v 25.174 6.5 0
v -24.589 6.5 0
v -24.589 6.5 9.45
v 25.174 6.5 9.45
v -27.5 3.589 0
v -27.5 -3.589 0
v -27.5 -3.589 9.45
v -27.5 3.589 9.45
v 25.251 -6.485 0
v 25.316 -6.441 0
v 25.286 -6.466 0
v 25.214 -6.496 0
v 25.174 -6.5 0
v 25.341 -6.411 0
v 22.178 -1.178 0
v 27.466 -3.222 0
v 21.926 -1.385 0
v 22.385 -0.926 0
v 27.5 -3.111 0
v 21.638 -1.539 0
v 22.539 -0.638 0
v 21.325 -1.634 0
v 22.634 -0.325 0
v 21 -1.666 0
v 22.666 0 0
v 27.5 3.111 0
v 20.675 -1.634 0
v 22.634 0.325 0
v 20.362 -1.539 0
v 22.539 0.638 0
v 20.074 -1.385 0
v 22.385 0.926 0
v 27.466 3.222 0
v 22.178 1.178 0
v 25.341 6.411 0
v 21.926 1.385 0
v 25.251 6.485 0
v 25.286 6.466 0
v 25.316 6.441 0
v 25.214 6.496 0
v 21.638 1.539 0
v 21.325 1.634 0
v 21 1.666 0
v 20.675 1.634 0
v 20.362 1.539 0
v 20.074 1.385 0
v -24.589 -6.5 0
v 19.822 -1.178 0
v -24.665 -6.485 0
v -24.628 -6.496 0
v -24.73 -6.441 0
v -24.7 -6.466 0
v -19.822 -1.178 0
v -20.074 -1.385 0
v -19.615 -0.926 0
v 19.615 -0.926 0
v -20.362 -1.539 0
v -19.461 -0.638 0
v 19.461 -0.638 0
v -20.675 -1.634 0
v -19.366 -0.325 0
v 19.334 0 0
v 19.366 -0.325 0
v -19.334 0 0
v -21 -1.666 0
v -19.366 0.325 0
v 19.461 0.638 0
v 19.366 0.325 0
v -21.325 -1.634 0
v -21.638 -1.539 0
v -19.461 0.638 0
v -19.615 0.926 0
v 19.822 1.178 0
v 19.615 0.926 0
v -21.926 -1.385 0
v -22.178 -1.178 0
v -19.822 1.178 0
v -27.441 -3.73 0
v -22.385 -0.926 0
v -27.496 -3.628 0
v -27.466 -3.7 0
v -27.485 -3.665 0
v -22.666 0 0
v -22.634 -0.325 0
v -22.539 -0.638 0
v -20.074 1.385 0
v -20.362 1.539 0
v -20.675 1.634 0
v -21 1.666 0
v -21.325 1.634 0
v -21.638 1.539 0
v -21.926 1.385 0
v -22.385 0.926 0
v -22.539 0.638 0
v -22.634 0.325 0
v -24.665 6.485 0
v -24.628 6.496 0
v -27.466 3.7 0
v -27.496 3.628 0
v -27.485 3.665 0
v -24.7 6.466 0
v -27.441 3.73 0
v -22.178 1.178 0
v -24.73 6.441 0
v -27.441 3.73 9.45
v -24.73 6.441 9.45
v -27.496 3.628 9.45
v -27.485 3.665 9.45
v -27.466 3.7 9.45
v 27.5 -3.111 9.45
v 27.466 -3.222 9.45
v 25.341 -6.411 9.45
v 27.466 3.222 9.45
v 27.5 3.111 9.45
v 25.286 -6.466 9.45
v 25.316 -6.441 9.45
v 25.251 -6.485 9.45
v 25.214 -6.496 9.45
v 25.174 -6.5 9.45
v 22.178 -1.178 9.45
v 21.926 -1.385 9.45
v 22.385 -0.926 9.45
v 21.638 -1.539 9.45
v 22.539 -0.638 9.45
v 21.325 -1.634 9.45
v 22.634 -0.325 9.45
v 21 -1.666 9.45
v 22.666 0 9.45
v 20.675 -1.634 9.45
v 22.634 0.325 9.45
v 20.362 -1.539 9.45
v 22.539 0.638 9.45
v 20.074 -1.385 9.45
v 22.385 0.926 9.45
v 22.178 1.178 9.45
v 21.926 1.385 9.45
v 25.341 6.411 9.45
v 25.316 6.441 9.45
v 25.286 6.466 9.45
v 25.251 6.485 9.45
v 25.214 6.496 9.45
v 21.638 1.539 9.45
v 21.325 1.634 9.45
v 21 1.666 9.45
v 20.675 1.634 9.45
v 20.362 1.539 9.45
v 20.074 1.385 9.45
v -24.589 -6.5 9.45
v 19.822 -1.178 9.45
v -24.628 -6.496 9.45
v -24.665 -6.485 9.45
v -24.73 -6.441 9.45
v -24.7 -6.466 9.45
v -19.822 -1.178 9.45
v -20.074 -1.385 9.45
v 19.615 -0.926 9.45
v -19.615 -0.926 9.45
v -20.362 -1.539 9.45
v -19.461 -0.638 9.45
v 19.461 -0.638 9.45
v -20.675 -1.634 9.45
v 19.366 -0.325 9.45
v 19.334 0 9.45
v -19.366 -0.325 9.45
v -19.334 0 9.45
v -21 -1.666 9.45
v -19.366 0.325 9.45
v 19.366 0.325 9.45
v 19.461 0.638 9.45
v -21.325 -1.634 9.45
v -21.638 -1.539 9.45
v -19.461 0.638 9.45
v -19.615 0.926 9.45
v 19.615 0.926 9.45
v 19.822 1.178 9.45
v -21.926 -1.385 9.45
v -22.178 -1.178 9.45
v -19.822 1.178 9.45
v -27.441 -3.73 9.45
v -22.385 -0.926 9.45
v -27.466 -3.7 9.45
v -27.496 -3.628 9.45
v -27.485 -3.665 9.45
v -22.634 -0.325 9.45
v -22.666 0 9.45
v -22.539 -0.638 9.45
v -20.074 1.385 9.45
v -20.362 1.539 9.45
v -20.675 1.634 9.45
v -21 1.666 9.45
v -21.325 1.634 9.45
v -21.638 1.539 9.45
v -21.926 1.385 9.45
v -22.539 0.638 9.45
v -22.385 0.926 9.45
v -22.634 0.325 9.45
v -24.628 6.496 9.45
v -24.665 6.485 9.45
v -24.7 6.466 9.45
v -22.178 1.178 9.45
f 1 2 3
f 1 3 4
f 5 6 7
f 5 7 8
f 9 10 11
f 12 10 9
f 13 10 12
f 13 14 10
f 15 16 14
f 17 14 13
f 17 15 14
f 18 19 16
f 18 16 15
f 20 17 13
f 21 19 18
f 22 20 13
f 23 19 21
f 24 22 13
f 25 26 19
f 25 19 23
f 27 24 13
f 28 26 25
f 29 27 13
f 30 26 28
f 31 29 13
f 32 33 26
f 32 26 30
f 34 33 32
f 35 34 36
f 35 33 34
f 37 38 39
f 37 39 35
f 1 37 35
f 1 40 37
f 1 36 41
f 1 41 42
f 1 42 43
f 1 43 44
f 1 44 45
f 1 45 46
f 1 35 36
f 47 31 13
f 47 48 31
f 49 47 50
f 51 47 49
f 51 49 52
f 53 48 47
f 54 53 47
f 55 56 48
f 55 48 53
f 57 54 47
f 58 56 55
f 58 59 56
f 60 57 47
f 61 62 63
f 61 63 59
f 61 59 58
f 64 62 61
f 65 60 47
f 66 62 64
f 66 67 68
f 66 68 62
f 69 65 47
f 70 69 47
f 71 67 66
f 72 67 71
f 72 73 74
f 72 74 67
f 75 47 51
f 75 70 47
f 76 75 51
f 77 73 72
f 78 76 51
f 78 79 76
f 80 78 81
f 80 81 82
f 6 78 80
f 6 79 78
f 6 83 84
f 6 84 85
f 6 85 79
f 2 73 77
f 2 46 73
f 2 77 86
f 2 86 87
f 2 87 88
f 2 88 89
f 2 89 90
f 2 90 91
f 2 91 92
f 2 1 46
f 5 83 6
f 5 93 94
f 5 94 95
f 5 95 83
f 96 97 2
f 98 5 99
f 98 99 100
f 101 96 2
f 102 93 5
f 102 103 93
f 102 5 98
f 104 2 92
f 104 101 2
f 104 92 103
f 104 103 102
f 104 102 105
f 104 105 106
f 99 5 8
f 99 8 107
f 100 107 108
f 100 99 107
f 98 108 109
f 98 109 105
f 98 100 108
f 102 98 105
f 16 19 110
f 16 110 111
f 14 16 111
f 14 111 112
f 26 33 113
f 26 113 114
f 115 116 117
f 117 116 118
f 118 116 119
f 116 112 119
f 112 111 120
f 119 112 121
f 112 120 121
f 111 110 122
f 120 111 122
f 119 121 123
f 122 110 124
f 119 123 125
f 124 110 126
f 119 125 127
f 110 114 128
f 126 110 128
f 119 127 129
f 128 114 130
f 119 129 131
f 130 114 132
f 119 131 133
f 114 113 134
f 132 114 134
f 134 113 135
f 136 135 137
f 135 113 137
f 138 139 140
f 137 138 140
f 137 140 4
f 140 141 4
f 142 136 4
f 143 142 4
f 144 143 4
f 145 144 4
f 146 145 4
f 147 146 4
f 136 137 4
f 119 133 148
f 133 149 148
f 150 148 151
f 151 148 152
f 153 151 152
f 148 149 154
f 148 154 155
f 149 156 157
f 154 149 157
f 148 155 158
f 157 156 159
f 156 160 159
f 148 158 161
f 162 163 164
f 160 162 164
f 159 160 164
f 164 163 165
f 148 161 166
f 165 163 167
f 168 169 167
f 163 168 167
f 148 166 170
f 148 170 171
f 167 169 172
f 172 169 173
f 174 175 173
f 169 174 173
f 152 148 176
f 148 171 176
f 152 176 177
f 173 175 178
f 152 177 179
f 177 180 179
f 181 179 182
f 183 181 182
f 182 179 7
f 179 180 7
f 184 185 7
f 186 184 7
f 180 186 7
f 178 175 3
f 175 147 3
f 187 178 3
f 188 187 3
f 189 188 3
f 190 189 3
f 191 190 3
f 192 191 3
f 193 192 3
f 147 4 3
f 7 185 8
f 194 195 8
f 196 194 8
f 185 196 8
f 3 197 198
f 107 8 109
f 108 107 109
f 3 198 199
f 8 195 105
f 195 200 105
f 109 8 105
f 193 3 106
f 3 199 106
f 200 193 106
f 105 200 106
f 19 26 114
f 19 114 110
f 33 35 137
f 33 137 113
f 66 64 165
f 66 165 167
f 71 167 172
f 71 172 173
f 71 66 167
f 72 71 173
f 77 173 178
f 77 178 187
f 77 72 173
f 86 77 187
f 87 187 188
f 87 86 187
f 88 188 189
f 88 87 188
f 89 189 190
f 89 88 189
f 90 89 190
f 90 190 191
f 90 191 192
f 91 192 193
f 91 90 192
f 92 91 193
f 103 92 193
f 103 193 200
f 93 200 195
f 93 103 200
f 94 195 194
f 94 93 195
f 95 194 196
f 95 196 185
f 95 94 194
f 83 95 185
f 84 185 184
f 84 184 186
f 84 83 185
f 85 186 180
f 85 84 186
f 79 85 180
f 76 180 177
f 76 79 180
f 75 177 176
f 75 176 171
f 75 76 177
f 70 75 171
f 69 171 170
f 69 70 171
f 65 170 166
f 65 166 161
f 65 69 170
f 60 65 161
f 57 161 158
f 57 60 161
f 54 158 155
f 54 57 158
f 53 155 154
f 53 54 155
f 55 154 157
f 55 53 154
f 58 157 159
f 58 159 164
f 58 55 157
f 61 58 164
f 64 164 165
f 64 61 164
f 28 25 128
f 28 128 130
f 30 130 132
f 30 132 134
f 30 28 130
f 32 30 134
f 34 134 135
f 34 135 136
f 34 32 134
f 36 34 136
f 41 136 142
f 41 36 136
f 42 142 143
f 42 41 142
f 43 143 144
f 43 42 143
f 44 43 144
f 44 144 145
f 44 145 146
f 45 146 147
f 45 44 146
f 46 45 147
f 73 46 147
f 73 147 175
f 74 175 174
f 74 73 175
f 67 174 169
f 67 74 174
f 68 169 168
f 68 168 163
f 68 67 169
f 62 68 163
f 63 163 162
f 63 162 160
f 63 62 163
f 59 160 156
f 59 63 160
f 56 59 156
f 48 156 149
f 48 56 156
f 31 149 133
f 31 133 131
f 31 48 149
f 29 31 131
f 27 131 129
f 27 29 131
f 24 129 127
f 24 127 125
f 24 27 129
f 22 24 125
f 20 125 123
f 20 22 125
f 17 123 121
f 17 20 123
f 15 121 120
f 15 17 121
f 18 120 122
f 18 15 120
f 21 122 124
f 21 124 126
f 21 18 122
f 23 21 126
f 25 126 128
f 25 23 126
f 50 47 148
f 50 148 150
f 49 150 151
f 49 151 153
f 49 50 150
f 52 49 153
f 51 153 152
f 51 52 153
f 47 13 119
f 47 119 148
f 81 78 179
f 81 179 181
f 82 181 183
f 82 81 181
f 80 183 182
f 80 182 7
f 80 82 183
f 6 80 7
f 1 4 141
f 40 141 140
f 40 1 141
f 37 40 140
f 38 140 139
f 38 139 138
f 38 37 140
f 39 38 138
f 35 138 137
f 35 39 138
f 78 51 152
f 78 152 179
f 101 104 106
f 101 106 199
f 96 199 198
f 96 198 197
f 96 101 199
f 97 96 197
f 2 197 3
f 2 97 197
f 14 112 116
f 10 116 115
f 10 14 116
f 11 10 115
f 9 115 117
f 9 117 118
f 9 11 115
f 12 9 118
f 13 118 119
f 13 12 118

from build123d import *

# Parameters (mm, degrees)
SKETCH1_R           = 1.666
BOSS_EXTRUDE1_DEPTH = 9.45


with BuildPart() as part:
    # Sketch1 → Boss-Extrude1 (new body)
    with BuildSketch(Plane.XY):
        with BuildLine():
            Line((-24.730151519, -6.441421356), (-27.441421356, -3.730151519))
            ThreePointArc((-27.441421356, -3.730151519), (-27.484775907, -3.665266849), (-27.5, -3.588730163))
            Line((-27.5, -3.588730163), (-27.5, 3.588730163))
            ThreePointArc((-27.5, 3.588730163), (-27.484775907, 3.665266849), (-27.441421356, 3.730151519))
            Line((-27.441421356, 3.730151519), (-24.730151519, 6.441421356))
            ThreePointArc((-24.730151519, 6.441421356), (-24.665266849, 6.484775907), (-24.588730163, 6.5))
            Line((-24.588730163, 6.5), (25.17448832, 6.5))
            ThreePointArc((25.17448832, 6.5), (25.268868885, 6.476330114), (25.340909677, 6.410923091))
            Line((25.340909677, 6.410923091), (27.466421356, 3.221951957))
            Line((27.466421356, 3.221951957), (27.5, 3.111028865))
            Line((27.5, 3.111028865), (27.5, -3.111028865))
            Line((27.5, -3.111028865), (27.466421356, -3.221951957))
            Line((27.466421356, -3.221951957), (25.340909677, -6.410923091))
            ThreePointArc((25.340909677, -6.410923091), (25.268868885, -6.476330114), (25.17448832, -6.5))
            Line((25.17448832, -6.5), (-24.588730163, -6.5))
            ThreePointArc((-24.588730163, -6.5), (-24.665266849, -6.484775907), (-24.730151519, -6.441421356))
        make_face()
        with Locations((21, 0)):
            Circle(SKETCH1_R, mode=Mode.SUBTRACT)
        with Locations((-21, 0)):
            Circle(SKETCH1_R, mode=Mode.SUBTRACT)
    extrude(amount=BOSS_EXTRUDE1_DEPTH)


solid = part.part
